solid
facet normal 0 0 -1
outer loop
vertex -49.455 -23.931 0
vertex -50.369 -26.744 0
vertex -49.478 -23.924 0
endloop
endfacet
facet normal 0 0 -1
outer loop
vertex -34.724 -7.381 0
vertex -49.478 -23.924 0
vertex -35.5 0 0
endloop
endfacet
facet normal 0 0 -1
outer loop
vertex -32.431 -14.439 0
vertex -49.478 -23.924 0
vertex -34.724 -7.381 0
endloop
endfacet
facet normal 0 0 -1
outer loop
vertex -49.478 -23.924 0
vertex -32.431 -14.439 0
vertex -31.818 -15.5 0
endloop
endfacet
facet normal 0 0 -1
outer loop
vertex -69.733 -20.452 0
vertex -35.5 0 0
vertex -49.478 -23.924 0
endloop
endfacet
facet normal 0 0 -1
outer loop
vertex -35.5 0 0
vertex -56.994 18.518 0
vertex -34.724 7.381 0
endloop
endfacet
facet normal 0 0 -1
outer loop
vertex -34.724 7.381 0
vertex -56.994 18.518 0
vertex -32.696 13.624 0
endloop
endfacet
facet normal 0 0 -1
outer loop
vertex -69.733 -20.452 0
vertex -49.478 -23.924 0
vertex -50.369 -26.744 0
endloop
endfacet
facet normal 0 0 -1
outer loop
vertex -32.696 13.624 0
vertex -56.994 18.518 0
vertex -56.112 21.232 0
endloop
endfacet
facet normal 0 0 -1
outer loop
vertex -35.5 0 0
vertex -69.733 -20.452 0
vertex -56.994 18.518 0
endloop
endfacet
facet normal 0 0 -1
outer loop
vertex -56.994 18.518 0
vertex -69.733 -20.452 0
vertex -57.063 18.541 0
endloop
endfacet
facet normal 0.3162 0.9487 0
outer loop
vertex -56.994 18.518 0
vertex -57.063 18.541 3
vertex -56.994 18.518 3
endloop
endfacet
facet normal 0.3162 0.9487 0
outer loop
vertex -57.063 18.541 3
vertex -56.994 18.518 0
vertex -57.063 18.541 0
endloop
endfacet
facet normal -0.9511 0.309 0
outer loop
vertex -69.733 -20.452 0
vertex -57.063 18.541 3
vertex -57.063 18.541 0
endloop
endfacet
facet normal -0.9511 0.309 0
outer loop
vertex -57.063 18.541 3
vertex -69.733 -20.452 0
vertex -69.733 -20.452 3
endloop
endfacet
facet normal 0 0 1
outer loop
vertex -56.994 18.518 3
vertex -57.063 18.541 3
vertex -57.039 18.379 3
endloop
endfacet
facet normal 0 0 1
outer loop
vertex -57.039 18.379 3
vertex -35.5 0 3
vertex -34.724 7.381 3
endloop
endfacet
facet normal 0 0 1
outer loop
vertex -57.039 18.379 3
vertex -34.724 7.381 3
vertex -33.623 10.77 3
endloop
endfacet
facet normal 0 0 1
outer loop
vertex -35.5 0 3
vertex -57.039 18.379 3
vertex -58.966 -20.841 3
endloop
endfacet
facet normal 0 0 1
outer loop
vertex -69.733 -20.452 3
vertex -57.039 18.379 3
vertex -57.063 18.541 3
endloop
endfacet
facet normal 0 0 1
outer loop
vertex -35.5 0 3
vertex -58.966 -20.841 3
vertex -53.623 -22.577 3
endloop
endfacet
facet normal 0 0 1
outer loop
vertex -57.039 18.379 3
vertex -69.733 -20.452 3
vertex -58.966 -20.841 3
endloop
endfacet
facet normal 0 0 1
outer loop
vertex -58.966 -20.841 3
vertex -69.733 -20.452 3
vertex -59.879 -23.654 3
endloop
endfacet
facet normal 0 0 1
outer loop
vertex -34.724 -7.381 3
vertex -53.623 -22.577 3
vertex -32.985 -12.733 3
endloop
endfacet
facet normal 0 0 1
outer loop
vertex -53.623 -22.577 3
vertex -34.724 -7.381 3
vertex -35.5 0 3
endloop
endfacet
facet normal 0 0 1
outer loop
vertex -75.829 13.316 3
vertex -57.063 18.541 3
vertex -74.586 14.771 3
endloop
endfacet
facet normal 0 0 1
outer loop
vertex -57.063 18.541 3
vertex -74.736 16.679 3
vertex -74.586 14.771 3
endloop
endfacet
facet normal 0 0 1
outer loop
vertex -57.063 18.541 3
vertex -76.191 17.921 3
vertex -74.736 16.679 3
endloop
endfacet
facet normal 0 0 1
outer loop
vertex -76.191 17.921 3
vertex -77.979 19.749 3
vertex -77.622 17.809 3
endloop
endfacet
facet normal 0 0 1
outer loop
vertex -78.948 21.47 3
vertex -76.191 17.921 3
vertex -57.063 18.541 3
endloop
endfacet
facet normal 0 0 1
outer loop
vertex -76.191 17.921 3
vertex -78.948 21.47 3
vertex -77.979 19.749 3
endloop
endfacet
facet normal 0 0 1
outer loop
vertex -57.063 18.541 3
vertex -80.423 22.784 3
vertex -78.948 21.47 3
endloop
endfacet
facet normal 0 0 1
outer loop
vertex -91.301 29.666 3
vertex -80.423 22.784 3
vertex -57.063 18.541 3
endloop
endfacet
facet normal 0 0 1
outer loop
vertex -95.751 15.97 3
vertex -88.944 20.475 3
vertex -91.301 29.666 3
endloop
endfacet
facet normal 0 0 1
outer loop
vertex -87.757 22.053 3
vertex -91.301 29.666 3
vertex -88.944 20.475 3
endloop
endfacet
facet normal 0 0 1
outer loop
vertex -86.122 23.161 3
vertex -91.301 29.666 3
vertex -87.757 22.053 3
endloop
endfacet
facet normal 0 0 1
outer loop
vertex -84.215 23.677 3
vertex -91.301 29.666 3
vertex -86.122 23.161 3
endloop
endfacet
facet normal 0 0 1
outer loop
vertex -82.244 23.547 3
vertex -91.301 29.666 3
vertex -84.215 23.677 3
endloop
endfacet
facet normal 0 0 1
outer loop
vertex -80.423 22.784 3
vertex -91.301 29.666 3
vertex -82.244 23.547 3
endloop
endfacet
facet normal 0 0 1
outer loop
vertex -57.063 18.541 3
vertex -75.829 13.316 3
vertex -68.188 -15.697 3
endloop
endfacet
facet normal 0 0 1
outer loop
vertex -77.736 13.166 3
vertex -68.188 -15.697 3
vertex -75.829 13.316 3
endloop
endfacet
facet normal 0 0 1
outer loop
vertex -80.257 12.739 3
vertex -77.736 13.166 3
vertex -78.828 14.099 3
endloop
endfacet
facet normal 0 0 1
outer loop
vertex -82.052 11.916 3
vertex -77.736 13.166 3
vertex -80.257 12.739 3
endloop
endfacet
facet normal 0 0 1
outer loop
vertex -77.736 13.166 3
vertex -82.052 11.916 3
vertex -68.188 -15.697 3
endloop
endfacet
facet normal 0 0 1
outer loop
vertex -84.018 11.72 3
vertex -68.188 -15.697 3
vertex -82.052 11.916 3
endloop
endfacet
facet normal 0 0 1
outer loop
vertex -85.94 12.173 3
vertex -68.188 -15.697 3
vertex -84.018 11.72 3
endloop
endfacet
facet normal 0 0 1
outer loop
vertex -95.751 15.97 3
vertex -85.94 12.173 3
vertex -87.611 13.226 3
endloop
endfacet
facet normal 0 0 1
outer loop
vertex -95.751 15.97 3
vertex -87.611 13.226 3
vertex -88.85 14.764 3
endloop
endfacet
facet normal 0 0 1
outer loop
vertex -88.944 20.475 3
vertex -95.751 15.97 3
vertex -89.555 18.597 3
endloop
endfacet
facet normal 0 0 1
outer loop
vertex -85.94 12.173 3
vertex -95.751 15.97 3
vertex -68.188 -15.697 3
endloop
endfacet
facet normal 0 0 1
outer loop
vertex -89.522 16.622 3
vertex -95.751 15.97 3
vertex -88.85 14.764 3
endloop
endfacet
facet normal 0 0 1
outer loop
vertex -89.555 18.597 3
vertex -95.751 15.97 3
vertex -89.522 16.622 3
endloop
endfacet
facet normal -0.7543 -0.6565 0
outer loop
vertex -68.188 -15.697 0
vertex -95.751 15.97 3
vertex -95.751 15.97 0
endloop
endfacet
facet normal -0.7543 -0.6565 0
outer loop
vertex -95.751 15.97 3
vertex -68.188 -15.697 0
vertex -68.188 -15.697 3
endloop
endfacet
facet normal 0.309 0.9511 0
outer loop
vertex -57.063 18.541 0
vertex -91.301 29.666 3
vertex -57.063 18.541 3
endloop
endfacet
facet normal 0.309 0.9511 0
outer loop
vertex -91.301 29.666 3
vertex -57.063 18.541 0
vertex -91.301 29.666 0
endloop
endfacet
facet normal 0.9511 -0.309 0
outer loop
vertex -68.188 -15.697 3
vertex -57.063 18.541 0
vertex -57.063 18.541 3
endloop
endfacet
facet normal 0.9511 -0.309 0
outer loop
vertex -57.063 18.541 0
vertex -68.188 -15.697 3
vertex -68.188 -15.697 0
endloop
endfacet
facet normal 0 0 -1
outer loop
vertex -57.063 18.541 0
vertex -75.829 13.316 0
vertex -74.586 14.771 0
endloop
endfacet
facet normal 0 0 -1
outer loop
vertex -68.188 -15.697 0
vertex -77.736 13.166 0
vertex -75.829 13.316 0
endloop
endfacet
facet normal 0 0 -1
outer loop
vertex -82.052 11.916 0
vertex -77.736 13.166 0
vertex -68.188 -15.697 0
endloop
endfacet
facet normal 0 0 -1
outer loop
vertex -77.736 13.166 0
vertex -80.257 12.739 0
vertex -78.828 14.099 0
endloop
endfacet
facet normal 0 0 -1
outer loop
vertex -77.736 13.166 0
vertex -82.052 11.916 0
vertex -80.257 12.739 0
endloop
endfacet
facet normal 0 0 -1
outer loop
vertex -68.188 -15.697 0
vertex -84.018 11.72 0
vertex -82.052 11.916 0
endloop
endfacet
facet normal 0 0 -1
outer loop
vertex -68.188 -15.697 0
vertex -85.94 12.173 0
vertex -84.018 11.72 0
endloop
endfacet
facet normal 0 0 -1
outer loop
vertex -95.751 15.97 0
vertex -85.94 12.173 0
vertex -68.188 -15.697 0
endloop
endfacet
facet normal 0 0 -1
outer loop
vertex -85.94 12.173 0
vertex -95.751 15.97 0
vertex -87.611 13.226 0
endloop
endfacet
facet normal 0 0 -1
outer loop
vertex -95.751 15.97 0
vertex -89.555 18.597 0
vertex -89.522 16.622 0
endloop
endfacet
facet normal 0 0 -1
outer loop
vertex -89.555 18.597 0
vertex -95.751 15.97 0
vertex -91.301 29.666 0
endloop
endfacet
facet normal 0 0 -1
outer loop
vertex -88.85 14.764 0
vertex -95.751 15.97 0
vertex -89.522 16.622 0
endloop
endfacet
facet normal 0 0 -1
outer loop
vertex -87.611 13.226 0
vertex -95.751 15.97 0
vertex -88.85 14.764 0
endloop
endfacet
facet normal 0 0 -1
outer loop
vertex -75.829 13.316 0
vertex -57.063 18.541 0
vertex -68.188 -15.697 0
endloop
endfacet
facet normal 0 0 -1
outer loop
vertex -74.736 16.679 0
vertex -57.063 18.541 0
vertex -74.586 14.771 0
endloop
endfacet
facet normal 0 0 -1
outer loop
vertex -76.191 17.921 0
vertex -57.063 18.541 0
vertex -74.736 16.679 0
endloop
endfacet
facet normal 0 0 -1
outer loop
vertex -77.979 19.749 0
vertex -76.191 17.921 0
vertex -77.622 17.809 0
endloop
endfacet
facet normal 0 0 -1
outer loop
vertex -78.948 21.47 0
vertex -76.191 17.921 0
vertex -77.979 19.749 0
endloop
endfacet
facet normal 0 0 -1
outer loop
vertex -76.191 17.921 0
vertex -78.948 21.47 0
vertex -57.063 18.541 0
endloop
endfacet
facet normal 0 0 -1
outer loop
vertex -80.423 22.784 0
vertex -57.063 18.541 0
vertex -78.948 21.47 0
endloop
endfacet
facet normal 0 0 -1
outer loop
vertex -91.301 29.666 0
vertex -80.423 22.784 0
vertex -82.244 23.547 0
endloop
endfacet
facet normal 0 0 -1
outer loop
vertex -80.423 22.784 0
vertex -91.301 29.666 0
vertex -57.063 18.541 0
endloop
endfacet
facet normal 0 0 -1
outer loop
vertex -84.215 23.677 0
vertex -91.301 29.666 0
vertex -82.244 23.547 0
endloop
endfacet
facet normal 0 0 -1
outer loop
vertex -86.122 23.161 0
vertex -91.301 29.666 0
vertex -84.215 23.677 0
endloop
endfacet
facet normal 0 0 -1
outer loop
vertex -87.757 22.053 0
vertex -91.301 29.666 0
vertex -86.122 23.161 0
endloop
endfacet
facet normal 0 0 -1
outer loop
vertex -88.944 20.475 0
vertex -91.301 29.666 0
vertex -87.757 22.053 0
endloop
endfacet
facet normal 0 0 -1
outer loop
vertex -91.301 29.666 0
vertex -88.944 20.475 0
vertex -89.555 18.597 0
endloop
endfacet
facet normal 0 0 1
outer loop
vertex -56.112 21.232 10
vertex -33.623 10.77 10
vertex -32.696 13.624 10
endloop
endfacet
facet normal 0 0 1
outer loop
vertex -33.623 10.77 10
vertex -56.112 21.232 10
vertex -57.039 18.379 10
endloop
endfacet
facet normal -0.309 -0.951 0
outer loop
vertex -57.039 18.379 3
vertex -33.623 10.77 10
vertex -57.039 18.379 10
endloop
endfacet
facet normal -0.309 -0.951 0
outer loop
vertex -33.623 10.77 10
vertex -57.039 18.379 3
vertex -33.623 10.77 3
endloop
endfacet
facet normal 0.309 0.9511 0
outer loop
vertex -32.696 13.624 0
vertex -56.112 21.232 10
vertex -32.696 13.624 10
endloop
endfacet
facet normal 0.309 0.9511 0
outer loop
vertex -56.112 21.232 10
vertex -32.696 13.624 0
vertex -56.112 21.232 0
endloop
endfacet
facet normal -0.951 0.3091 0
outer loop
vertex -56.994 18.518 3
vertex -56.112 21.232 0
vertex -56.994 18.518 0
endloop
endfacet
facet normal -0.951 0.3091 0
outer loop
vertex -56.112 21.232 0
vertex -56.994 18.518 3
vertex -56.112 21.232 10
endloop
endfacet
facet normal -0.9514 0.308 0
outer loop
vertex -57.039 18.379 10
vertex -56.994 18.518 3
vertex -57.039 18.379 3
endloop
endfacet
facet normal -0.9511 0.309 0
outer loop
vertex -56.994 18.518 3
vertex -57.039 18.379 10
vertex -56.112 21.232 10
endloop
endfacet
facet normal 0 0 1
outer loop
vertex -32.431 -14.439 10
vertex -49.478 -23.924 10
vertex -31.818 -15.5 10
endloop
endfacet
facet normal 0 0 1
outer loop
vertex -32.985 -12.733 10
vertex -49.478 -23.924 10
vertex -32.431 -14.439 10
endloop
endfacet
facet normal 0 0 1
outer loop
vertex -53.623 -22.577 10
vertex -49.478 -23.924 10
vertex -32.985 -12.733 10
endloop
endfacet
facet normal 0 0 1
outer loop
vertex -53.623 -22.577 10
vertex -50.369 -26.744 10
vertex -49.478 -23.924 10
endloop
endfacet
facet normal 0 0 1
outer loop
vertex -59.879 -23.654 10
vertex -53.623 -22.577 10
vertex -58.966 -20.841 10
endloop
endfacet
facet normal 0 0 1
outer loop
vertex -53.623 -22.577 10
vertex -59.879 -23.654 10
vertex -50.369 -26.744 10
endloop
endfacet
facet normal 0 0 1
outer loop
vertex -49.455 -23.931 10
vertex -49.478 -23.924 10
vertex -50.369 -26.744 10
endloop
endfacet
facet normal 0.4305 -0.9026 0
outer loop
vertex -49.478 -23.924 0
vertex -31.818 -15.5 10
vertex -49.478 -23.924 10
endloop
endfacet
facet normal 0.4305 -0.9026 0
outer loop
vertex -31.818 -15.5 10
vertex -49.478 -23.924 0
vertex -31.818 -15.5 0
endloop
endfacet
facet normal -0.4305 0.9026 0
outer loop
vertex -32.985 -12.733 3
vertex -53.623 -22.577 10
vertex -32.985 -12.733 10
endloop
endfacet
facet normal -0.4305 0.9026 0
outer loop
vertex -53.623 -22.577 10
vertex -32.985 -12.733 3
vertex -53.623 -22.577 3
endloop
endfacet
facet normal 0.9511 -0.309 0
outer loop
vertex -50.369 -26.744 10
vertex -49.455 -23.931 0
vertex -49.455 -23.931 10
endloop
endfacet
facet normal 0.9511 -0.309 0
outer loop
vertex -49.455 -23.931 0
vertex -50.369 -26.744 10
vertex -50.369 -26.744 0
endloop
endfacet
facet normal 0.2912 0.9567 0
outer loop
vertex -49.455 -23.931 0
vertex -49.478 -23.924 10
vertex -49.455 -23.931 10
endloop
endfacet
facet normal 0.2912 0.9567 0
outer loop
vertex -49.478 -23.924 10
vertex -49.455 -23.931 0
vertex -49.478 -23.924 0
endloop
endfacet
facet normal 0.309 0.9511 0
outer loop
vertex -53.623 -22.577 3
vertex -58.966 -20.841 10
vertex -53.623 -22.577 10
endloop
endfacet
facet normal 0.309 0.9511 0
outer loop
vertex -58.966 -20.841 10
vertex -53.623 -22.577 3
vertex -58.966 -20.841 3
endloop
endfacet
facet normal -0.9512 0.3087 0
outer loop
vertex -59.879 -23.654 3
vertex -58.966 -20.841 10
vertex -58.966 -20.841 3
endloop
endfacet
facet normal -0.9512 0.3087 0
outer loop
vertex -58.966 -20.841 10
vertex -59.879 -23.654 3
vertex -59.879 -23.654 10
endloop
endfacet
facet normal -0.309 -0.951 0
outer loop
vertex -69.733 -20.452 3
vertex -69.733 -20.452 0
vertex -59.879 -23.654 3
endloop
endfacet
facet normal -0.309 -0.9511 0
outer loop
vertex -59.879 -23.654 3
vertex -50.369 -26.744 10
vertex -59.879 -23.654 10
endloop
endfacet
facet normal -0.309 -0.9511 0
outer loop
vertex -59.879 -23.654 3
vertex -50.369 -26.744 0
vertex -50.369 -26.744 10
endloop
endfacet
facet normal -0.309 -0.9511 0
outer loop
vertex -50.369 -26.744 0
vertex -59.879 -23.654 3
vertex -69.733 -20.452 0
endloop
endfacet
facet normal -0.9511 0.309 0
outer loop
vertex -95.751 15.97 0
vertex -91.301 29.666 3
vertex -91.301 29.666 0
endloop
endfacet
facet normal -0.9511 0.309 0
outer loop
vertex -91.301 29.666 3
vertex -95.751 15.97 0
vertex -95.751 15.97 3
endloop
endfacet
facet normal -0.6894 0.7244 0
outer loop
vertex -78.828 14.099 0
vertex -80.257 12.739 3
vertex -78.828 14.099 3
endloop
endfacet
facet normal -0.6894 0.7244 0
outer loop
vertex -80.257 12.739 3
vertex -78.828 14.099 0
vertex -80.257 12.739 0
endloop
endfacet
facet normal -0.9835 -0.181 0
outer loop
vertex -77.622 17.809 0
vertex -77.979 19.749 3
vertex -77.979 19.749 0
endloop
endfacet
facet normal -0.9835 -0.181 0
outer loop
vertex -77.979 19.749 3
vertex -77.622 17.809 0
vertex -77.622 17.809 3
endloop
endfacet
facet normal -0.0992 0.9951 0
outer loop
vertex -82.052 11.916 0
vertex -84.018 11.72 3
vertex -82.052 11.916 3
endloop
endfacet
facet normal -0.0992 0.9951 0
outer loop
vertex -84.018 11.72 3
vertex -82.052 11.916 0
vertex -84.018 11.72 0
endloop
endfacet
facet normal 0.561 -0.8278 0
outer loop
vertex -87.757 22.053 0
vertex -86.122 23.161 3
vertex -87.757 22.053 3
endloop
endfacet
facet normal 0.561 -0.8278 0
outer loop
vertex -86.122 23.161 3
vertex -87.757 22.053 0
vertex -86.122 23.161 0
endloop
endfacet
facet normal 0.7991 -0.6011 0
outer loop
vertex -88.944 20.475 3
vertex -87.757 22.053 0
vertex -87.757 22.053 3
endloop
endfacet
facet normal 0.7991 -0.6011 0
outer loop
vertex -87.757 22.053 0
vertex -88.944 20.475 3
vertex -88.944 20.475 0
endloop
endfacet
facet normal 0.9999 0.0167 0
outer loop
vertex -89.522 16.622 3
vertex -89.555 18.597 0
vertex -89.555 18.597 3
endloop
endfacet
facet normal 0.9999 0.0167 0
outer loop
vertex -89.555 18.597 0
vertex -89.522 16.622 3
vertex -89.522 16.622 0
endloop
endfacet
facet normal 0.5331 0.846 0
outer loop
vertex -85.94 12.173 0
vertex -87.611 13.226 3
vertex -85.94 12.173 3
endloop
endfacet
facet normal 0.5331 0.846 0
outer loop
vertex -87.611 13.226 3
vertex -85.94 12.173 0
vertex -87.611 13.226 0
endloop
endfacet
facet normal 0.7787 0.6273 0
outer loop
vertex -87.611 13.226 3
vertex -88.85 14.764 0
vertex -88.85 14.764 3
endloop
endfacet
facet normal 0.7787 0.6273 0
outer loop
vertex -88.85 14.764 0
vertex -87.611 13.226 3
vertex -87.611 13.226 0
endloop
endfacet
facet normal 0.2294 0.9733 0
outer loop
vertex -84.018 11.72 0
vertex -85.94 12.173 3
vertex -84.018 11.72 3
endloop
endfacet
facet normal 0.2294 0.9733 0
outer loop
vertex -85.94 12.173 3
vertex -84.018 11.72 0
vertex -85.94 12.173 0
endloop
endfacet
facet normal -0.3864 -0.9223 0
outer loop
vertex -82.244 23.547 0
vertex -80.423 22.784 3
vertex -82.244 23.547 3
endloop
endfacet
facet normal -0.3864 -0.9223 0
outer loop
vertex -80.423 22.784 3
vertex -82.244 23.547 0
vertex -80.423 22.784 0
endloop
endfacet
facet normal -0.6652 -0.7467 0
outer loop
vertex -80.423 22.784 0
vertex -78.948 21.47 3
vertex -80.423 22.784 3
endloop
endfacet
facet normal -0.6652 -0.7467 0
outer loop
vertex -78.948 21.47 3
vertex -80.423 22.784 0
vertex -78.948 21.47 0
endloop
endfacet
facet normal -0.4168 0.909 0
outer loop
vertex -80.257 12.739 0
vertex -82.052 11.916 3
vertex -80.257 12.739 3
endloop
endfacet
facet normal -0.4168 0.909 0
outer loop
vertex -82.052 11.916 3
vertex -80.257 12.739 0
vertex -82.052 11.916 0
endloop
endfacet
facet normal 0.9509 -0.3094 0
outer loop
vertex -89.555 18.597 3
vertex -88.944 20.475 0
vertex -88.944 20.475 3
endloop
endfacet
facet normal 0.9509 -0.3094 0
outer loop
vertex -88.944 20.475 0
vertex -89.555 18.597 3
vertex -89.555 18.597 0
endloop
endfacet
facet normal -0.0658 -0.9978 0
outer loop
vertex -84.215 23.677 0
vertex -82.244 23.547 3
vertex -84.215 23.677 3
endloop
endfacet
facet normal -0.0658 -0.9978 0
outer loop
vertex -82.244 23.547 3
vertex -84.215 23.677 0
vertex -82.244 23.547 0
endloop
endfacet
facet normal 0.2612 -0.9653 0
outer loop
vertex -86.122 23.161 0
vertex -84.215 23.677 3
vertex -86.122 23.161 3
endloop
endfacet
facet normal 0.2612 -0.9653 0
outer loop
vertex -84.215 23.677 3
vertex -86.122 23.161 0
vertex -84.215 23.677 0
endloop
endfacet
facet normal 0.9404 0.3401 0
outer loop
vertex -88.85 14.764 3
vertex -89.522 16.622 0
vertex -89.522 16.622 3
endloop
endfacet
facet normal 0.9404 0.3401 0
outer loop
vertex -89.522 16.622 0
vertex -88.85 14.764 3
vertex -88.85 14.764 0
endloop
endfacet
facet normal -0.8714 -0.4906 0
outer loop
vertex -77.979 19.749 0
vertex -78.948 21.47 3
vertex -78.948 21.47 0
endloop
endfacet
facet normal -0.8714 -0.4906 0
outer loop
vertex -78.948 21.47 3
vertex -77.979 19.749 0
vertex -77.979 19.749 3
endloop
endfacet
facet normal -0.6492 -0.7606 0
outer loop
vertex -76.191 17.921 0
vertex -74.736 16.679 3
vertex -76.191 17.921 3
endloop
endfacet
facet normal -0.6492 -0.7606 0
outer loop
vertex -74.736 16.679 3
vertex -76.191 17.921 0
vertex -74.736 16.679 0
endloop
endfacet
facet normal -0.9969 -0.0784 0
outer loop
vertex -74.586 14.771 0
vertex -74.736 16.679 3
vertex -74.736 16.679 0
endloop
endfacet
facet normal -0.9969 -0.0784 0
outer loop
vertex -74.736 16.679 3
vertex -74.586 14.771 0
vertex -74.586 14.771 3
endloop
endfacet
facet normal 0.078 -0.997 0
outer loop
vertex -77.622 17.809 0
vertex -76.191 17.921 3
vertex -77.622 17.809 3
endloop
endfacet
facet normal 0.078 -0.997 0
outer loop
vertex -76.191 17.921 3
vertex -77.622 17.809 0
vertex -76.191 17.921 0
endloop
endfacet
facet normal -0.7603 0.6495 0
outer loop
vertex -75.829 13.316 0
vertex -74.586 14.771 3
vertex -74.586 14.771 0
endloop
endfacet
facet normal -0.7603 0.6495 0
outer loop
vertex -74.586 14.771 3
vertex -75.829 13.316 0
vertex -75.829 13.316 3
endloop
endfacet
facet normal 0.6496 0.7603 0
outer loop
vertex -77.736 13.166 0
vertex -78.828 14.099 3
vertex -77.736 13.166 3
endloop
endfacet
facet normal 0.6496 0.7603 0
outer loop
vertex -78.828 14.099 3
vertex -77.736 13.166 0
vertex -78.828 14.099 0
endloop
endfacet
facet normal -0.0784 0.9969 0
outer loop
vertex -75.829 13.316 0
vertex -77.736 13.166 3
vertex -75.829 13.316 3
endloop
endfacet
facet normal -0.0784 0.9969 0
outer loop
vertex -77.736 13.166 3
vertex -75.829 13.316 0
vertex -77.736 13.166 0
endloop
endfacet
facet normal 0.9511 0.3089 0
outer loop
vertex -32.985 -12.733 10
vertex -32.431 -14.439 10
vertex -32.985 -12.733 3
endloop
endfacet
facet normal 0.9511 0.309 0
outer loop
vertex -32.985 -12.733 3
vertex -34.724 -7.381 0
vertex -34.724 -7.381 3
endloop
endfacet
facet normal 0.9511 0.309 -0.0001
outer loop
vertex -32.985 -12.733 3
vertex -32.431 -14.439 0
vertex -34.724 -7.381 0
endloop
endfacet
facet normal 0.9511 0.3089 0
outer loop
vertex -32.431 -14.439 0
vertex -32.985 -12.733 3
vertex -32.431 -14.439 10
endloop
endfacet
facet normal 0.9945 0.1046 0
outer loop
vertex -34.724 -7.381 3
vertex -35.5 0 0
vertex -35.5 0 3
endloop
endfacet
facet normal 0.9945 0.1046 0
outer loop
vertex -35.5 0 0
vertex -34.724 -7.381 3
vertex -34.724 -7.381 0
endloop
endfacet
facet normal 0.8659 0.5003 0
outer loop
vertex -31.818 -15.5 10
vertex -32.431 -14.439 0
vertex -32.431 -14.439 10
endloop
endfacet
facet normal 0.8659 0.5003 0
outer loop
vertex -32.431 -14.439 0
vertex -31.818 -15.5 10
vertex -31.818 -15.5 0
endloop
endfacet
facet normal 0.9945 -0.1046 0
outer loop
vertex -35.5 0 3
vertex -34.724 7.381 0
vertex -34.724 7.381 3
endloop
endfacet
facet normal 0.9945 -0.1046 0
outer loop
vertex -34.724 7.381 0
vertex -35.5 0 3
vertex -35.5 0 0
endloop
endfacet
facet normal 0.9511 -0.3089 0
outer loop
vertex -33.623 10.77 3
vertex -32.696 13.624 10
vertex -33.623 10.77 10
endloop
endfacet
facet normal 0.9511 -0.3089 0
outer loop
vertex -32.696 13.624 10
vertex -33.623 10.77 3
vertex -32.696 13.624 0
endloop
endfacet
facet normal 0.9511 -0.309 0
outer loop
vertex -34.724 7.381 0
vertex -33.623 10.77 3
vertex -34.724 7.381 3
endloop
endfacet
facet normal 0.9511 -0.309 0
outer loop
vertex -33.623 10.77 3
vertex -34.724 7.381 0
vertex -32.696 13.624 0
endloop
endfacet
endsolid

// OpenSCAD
difference() {
	difference() {
		union() {
			rotate([0,0,180-18]) {
				tri(60,54,3);
			}

			rotate([0,180,180-18]) {
				translate([-120,0,-3]) {
					tri(60,36,3);
				}
			}

			translate([0,3,0]) {
				rotate([0,0,180-18]) {
					translate([34,0,0]) {
						cube([25,3,10]);
					}
				}
			}

			translate([0,3,0]) {
				rotate([0,0,180+25.5]) {
					translate([34,0,0]) {
						cube([47,3,10]);
					}
				}
			}

			translate([0,-40,0]) {
				rotate([0,0,180-18]) {
					translate([52,0,0]) {
						cube([10,3,10]);
					}
				}
			}


		}
		union() {
			rotate([0,0,-18]) {
				translate([-100,-61,-2]) {
					cube([80,20,20]);
				}
			}

			rotate([0,0,-18]) {
				translate([-136,-30,-2]) {
					cube([40,40,20]);
				}
			}
			rotate([0,0,-18]) {
				translate([-85,-9,-5]) {
					cylinder(10, 6, 6);
				}
			}
			rotate([0,0,-18]) {
				translate([-78,-9,-5]) {
					cylinder(10, 2.5, 2.5);
				}
			}
		}
	}

	translate([0,0,-3]) {
		cylinder(70, 35.5, 35.5);
	}
}


module tri(b,c,h) {
	polyhedron( 
		points = [[0,0,0],[b,0,0],[b,c,0],[0,0,h],[b,0,h],[b,c,h]],
		triangles = [[0,1,2], [0,4,1], [1,5,2], [0,2,3],[0,3,4],[1,4,5],[2,5,3],[3,5,4]]
	);
}
